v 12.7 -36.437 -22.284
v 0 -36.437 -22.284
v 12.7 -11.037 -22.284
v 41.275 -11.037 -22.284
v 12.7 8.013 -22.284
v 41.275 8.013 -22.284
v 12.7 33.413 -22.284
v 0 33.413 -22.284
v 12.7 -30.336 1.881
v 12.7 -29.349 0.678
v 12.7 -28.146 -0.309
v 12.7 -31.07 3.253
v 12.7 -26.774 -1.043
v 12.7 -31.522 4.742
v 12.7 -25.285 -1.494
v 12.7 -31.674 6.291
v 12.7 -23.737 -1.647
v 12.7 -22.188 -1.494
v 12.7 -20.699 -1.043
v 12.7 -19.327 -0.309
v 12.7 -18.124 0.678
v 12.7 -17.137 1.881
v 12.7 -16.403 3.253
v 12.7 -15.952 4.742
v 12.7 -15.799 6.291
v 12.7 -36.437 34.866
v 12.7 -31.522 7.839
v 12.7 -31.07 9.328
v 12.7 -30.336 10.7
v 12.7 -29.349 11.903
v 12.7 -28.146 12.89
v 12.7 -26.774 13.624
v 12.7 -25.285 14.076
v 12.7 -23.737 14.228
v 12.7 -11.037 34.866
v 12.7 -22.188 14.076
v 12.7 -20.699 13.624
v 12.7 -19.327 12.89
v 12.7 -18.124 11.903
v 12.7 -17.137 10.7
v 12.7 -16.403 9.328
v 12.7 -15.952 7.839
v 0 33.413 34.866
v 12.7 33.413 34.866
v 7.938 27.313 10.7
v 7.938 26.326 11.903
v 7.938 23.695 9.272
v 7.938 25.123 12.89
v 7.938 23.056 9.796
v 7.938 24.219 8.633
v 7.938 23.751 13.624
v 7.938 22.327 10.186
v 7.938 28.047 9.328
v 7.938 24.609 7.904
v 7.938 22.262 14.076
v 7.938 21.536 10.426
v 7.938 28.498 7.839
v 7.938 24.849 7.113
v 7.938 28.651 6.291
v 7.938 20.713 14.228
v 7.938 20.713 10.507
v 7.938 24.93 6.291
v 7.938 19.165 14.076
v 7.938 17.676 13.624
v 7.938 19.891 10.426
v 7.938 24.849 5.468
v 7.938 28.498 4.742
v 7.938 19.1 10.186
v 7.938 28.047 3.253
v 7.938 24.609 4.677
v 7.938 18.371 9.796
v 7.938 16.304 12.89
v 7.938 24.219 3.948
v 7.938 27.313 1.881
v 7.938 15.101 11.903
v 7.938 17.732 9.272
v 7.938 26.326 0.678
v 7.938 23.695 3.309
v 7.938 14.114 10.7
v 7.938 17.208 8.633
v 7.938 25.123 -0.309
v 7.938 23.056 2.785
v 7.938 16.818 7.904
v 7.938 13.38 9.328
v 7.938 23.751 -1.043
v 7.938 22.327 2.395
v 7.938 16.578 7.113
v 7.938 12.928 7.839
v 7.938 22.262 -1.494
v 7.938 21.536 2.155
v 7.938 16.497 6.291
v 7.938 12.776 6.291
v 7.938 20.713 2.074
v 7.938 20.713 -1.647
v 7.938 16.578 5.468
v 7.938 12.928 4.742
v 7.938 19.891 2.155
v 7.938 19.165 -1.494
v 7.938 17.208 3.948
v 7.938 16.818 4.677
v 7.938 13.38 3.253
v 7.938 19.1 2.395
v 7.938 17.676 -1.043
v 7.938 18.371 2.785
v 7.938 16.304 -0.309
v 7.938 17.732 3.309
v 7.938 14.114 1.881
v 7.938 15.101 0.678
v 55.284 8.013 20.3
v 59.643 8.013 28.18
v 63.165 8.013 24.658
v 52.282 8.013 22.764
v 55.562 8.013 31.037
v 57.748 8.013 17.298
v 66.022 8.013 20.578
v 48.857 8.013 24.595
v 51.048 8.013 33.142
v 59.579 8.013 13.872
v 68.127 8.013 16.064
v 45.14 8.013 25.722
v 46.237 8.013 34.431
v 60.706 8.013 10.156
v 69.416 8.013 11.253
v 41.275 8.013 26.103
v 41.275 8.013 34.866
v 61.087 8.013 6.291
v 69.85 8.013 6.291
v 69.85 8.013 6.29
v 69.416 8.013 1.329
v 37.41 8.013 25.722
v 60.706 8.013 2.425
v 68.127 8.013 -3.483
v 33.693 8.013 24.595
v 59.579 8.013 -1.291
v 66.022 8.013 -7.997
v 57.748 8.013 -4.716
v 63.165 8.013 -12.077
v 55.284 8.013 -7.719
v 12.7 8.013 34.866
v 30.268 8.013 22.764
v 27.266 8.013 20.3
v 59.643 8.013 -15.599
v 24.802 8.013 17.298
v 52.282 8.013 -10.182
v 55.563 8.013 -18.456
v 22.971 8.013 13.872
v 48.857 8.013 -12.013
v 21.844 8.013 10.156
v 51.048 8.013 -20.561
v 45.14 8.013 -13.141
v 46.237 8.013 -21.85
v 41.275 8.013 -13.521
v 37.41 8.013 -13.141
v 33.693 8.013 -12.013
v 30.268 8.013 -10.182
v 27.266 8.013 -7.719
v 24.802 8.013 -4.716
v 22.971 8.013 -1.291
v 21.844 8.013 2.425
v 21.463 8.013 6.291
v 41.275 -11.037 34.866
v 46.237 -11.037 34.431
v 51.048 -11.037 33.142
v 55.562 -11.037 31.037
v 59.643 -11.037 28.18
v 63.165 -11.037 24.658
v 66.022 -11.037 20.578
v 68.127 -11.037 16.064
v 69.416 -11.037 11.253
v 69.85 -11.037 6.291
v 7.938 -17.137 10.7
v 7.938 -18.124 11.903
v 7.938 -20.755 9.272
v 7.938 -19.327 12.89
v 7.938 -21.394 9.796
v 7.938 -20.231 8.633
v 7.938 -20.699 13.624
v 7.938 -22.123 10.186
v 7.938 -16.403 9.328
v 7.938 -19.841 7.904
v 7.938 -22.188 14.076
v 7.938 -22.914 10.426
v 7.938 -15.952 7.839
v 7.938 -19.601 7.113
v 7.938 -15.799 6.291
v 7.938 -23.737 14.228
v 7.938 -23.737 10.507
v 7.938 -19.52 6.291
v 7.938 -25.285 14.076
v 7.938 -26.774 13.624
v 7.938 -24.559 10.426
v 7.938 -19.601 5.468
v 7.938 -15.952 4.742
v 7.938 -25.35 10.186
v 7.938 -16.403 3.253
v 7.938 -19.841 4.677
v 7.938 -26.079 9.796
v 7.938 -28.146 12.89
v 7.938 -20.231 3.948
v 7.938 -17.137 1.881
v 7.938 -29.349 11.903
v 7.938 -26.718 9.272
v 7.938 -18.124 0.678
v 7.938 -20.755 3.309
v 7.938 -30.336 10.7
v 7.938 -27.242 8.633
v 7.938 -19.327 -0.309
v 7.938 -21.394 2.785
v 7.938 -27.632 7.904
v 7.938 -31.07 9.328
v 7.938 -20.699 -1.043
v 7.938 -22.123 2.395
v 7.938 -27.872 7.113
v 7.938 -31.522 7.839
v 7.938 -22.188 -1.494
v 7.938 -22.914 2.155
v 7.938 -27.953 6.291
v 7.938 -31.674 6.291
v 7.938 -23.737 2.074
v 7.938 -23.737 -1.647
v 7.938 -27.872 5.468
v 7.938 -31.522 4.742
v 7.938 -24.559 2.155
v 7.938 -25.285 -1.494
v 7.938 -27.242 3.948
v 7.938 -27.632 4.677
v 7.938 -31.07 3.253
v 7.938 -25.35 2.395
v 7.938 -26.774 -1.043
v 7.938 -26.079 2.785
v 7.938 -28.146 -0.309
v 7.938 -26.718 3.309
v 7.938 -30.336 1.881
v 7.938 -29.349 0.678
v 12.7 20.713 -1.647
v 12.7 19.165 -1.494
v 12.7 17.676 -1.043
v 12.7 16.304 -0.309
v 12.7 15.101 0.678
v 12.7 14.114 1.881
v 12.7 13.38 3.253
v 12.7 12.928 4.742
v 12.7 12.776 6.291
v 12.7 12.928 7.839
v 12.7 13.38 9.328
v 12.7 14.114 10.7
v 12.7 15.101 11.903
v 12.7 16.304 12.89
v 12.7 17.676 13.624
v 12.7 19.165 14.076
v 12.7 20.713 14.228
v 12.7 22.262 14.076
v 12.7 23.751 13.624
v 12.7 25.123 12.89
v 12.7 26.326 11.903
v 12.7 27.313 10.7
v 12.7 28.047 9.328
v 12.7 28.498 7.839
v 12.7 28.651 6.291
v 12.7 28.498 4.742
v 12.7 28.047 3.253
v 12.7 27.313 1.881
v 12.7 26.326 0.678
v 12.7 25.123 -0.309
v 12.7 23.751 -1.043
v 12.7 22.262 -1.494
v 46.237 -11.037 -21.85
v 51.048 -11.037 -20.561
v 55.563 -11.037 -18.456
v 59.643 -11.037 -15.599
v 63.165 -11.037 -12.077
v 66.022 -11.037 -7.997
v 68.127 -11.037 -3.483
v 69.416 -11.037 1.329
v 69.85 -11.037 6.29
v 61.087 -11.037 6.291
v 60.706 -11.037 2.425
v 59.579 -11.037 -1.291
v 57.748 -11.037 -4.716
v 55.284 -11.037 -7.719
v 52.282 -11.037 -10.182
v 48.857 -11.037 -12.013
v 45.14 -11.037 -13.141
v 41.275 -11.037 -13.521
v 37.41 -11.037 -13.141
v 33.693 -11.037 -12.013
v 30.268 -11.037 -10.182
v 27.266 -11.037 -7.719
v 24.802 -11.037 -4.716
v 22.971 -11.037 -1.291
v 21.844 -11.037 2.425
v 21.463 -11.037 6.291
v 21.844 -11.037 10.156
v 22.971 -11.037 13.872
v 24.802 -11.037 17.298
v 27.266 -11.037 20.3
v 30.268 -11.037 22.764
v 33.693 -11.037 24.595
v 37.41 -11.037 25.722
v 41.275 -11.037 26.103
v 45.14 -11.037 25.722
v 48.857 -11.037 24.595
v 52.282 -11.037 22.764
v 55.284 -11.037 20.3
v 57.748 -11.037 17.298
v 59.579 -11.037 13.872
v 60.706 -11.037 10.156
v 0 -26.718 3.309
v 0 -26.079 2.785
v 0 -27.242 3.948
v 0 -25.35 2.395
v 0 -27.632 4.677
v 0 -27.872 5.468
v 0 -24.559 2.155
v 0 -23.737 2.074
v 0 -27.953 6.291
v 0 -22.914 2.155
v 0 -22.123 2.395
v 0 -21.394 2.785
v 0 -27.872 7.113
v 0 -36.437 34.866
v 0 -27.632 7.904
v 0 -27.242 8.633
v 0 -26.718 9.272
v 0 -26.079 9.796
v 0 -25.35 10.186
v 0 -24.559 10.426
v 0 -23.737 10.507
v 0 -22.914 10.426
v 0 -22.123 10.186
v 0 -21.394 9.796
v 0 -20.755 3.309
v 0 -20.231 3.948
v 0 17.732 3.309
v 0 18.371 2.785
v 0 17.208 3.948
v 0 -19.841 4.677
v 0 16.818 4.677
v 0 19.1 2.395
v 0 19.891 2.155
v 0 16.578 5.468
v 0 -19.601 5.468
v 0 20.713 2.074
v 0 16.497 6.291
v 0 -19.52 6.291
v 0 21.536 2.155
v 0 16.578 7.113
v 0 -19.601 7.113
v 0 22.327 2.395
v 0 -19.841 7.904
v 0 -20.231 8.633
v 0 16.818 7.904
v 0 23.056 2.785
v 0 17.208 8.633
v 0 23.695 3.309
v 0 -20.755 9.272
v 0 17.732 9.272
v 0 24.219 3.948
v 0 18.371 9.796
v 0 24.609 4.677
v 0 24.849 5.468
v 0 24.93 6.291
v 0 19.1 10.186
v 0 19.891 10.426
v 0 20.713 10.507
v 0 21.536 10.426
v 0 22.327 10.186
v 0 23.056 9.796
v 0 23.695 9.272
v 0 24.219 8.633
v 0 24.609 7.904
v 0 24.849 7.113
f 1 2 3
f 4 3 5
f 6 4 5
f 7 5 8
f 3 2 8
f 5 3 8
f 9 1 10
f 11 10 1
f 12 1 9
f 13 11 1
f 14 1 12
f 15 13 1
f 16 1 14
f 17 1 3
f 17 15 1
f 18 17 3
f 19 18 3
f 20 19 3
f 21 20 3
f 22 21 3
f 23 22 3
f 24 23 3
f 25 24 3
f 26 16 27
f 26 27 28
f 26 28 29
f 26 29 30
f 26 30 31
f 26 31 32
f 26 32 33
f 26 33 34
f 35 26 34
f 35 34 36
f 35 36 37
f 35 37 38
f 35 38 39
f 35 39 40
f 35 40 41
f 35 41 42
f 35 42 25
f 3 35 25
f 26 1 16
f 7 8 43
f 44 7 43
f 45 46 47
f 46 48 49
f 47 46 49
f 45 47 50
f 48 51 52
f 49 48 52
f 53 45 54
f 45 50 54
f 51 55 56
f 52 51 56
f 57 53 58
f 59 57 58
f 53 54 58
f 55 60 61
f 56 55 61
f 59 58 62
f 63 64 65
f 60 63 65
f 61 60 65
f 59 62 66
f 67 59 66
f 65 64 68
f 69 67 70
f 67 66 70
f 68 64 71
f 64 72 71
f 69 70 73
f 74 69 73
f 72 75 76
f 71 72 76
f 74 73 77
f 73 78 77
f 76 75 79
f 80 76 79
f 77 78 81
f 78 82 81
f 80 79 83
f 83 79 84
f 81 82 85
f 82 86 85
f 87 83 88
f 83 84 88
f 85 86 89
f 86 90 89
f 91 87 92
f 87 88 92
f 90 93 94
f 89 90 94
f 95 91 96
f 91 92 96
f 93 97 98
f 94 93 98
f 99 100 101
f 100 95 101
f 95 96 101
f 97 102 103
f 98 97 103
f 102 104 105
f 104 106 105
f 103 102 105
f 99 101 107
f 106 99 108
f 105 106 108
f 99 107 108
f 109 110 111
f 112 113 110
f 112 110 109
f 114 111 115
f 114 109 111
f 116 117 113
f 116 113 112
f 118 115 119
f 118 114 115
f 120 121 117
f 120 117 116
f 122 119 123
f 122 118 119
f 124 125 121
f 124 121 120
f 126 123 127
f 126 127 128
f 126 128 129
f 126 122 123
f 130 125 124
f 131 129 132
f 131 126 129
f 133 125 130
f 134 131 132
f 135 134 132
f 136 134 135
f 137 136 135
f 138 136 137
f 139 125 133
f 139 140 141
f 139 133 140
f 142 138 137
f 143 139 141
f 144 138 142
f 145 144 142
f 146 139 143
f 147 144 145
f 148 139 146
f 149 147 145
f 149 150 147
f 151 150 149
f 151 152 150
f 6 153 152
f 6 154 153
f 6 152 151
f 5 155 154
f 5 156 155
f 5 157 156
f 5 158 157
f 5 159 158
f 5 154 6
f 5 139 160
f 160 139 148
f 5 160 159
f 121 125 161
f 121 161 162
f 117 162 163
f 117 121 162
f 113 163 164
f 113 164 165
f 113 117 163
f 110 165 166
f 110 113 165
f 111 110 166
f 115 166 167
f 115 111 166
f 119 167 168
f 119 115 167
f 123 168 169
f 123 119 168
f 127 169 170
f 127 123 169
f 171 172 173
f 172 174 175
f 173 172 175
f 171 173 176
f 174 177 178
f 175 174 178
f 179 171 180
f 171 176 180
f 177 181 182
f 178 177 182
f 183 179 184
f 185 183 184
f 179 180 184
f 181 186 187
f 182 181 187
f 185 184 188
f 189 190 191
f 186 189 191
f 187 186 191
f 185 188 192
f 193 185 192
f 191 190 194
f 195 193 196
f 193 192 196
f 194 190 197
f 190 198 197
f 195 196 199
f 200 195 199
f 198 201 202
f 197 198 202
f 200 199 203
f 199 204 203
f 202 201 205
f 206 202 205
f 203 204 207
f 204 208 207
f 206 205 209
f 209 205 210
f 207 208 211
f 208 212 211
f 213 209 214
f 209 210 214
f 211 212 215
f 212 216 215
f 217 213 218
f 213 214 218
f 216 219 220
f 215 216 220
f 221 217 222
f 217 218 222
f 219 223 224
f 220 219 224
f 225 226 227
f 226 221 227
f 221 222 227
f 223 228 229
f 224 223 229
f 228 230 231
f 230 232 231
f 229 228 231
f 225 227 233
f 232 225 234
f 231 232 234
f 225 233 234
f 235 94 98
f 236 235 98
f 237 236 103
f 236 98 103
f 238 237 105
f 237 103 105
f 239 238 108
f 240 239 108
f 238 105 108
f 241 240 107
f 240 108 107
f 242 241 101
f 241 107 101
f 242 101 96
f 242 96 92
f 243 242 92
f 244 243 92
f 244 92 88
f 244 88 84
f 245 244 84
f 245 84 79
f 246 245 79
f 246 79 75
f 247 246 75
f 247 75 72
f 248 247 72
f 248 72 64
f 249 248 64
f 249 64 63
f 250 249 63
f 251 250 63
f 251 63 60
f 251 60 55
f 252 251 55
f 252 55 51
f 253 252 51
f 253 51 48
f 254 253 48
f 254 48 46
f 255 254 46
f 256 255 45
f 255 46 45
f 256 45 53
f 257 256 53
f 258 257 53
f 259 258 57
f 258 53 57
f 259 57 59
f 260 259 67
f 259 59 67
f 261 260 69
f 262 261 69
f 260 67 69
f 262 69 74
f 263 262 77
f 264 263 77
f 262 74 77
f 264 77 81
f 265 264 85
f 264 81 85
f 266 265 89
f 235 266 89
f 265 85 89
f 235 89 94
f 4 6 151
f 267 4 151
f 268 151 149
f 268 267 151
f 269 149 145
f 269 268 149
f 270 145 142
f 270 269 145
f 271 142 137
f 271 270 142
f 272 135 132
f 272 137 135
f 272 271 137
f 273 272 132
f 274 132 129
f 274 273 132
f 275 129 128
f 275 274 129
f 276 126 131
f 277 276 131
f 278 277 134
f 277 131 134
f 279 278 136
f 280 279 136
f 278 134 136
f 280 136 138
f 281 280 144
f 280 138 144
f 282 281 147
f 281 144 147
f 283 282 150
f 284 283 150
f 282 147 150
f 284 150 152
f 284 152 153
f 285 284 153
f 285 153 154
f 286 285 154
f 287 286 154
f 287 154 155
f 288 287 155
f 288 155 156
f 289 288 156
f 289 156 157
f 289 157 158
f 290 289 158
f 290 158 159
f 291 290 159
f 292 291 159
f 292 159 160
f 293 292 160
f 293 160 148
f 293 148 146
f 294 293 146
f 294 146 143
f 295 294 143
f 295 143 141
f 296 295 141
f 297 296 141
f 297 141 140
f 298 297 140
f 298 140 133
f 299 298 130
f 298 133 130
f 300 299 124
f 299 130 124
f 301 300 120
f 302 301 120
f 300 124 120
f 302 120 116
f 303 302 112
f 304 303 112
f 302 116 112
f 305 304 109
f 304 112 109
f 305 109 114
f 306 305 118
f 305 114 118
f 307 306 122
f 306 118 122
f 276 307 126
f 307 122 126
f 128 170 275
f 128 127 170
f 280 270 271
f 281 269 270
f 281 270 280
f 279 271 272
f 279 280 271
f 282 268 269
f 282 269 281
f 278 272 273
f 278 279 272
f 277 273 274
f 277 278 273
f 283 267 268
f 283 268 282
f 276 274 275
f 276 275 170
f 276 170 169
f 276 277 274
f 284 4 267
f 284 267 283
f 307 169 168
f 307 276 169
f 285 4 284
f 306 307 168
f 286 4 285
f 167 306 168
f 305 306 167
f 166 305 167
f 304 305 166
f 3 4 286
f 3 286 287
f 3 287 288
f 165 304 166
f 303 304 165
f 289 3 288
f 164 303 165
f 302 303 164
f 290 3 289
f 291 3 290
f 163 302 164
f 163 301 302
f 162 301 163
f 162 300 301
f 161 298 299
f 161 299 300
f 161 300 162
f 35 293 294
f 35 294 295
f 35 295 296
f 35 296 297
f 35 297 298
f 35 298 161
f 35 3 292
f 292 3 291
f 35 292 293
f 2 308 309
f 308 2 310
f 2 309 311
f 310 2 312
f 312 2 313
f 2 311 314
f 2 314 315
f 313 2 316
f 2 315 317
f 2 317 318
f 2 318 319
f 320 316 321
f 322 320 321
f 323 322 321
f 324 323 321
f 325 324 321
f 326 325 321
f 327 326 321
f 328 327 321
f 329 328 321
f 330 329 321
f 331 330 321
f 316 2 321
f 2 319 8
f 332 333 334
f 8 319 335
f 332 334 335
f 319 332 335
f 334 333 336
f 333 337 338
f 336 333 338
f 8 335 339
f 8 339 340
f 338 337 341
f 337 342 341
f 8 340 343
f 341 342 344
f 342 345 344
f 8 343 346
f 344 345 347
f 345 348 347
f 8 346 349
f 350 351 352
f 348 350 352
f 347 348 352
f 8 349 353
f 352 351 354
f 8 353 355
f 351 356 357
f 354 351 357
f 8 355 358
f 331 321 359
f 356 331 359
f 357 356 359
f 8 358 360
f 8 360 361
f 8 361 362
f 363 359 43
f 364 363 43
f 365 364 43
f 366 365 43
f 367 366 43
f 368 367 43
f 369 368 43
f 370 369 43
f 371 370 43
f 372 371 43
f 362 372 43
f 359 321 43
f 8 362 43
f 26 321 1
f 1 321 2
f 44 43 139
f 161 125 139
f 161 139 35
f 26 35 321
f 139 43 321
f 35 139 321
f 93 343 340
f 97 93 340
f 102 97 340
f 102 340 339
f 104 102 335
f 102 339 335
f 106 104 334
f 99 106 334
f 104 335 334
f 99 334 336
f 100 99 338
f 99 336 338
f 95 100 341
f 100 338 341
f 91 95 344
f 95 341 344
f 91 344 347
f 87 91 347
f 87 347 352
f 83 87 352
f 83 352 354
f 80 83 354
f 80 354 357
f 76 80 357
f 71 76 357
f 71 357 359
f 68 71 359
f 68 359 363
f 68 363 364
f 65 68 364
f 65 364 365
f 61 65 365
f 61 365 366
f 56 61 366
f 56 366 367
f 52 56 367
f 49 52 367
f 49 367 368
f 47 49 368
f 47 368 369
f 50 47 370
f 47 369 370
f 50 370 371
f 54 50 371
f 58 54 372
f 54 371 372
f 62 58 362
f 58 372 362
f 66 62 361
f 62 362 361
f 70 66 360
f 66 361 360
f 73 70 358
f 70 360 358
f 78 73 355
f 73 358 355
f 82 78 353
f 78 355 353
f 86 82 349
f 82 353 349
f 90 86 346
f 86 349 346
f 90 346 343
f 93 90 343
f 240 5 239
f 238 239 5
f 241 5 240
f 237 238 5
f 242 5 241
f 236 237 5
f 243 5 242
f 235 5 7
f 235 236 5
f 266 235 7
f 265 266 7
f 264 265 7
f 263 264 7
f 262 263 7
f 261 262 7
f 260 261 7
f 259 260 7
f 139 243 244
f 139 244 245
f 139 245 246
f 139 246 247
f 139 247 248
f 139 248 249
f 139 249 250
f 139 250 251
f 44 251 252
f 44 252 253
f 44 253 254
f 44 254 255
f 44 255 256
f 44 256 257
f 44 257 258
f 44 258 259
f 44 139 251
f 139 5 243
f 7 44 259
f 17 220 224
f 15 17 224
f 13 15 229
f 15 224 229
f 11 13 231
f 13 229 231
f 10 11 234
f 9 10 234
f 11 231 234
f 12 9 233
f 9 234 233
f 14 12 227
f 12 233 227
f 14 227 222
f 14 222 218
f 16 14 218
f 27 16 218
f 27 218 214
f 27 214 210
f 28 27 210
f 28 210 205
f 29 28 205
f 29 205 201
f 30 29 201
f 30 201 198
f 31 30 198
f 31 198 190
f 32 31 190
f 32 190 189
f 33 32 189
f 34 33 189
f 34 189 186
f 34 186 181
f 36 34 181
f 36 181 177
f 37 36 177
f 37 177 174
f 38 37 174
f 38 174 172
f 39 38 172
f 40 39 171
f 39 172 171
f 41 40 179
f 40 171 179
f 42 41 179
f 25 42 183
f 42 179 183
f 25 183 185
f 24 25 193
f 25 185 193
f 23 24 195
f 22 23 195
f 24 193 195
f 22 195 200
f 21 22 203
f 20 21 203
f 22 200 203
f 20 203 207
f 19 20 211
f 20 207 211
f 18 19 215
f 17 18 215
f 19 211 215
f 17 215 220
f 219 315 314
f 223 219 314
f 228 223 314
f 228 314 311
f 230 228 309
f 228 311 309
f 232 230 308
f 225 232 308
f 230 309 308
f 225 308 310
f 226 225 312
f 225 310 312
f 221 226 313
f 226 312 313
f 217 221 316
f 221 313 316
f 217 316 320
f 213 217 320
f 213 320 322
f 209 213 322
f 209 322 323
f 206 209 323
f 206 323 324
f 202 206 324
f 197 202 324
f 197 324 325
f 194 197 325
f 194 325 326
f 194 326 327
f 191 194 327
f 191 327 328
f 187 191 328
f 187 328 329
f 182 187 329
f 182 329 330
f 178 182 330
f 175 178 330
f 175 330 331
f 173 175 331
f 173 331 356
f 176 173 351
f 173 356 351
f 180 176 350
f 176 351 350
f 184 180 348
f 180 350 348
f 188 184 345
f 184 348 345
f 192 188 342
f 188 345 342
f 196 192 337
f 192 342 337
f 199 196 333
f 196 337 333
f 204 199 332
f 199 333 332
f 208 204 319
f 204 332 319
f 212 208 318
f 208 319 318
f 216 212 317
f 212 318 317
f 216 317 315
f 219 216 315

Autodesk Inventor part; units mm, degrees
ref_plane "YZ Plane" through (0, 0, 0) normal (1, 0, 0) x (0, 1, 0)
ref_plane "XZ Plane" through (0, 0, 0) normal (0, 1, 0) x (-1, 0, 0)
ref_plane "XY Plane" through (0, 0, 0) normal (0, 0, 1) x (1, 0, 0)
sketch "Sketch1" plane through (0, 0, 0) normal (1, 0, 0) x (0, 1, 0)
  line L0 (33.4134, 34.8656) -> (-36.4366, 34.8656)
  line L1 (-36.4366, 34.8656) -> (-36.4366, -22.2844)
  line L2 (-36.4366, -22.2844) -> (33.4134, -22.2844)
  line L3 (33.4134, -22.2844) -> (33.4134, 34.8656)
  point P0 (0, 0)
  dimension "d0" = 57.15
  dimension "d1" = 69.85
extrude "Extrusion1" add sketch "Sketch1" along normal blind 12.7
sketch "Sketch2" plane through (12.7, 0, 0) normal (1, 0, 0) x (0, 0, -1)
  line L0 (-34.8656, 8.0134) -> (22.2844, 8.0134)
  line L1 (22.2844, 8.0134) -> (22.2844, -11.0366)
  line L2 (22.2844, -11.0366) -> (-34.8656, -11.0366)
  line L3 (-34.8656, -11.0366) -> (-34.8656, 8.0134)
  line L4 (22.2844, -36.4366) -> (22.2844, 33.4134) projected
  line L5 (-34.8656, 33.4134) -> (-34.8656, -36.4366) projected
  line L6 (22.2844, 33.4134) -> (-34.8656, 33.4134) projected
  point P0 (0, 0)
  dimension "d5" = 0
  dimension "d9" = 57.15
  dimension "d16" = 19.05
  dimension "d17" = 25.4
extrude "Extrusion2" add sketch "Sketch2" along normal blind 57.15 contours L0 L1 L2 L3
fillet "Fillet1" radius 28.575 1 edges at (69.85, -1.5116, 34.8656)
fillet "Fillet2" radius 28.575 1 edges at (69.85, -1.5116, -22.2844)
sketch "Sketch3" plane through (12.7, 8.0134, 34.8656) normal (0, 1, 0) x (1, 0, 0)
  circle A0 centre (28.575, 28.575) radius 19.812
  line L0 (0, 0) -> (28.575, 0) projected
  line L1 (0, 57.15) -> (0, 0) projected
  point P0 (-12.7, 34.8656)
  dimension "d11" = 39.624
  dimension "d12" = 28.575
  dimension "d13" = 28.575
extrude "Extrusion3" cut sketch "Sketch3" against normal blind 50.8
sketch "Sketch4" plane through (12.7, 0, 0) normal (1, 0, 0) x (0, 0, -1)
  point P0 (0, 0)
sketch "Sketch5" plane through (12.7, 0, 0) normal (1, 0, 0) x (0, 0, -1)
  line L0 (22.2844, -36.4366) -> (22.2844, 33.4134) projected
  line L1 (22.2844, 33.4134) -> (-34.8656, 33.4134) projected
  point P0 (0, 0)
  point P1 (-6.2906, 20.7134)
  dimension "d25" = 28.575
  dimension "d35" = 12.7
hole "Hole1" at (12.7, 20.7134, 6.2906) direction (-1, 0, 0) diameter 8.4328 end through all counterbore diameter 15.875 counterbore depth 4.7625 clearance for "Socket Head Cap Screw" size "5/16" standard "Ansi Unified Screw Threads"
sketch "Sketch6" plane through (12.7, 0, 0) normal (1, 0, 0) x (0, 0, -1)
  line L0 (22.2844, -36.4366) -> (22.2844, 33.4134) projected
  line L1 (-34.8656, -36.4366) -> (22.2844, -36.4366) projected
  point P0 (0, 0)
  point P1 (-6.2906, -23.7366)
  dimension "d33" = 28.575
  dimension "d34" = 12.7
hole "Hole2" at (12.7, -23.7366, 6.2906) direction (-1, 0, 0) diameter 8.4328 end through all counterbore diameter 15.875 counterbore depth 4.7625 clearance for "Socket Head Cap Screw" size "5/16" standard "Ansi Unified Screw Threads"
properties part number "Organic Filter Holder"
